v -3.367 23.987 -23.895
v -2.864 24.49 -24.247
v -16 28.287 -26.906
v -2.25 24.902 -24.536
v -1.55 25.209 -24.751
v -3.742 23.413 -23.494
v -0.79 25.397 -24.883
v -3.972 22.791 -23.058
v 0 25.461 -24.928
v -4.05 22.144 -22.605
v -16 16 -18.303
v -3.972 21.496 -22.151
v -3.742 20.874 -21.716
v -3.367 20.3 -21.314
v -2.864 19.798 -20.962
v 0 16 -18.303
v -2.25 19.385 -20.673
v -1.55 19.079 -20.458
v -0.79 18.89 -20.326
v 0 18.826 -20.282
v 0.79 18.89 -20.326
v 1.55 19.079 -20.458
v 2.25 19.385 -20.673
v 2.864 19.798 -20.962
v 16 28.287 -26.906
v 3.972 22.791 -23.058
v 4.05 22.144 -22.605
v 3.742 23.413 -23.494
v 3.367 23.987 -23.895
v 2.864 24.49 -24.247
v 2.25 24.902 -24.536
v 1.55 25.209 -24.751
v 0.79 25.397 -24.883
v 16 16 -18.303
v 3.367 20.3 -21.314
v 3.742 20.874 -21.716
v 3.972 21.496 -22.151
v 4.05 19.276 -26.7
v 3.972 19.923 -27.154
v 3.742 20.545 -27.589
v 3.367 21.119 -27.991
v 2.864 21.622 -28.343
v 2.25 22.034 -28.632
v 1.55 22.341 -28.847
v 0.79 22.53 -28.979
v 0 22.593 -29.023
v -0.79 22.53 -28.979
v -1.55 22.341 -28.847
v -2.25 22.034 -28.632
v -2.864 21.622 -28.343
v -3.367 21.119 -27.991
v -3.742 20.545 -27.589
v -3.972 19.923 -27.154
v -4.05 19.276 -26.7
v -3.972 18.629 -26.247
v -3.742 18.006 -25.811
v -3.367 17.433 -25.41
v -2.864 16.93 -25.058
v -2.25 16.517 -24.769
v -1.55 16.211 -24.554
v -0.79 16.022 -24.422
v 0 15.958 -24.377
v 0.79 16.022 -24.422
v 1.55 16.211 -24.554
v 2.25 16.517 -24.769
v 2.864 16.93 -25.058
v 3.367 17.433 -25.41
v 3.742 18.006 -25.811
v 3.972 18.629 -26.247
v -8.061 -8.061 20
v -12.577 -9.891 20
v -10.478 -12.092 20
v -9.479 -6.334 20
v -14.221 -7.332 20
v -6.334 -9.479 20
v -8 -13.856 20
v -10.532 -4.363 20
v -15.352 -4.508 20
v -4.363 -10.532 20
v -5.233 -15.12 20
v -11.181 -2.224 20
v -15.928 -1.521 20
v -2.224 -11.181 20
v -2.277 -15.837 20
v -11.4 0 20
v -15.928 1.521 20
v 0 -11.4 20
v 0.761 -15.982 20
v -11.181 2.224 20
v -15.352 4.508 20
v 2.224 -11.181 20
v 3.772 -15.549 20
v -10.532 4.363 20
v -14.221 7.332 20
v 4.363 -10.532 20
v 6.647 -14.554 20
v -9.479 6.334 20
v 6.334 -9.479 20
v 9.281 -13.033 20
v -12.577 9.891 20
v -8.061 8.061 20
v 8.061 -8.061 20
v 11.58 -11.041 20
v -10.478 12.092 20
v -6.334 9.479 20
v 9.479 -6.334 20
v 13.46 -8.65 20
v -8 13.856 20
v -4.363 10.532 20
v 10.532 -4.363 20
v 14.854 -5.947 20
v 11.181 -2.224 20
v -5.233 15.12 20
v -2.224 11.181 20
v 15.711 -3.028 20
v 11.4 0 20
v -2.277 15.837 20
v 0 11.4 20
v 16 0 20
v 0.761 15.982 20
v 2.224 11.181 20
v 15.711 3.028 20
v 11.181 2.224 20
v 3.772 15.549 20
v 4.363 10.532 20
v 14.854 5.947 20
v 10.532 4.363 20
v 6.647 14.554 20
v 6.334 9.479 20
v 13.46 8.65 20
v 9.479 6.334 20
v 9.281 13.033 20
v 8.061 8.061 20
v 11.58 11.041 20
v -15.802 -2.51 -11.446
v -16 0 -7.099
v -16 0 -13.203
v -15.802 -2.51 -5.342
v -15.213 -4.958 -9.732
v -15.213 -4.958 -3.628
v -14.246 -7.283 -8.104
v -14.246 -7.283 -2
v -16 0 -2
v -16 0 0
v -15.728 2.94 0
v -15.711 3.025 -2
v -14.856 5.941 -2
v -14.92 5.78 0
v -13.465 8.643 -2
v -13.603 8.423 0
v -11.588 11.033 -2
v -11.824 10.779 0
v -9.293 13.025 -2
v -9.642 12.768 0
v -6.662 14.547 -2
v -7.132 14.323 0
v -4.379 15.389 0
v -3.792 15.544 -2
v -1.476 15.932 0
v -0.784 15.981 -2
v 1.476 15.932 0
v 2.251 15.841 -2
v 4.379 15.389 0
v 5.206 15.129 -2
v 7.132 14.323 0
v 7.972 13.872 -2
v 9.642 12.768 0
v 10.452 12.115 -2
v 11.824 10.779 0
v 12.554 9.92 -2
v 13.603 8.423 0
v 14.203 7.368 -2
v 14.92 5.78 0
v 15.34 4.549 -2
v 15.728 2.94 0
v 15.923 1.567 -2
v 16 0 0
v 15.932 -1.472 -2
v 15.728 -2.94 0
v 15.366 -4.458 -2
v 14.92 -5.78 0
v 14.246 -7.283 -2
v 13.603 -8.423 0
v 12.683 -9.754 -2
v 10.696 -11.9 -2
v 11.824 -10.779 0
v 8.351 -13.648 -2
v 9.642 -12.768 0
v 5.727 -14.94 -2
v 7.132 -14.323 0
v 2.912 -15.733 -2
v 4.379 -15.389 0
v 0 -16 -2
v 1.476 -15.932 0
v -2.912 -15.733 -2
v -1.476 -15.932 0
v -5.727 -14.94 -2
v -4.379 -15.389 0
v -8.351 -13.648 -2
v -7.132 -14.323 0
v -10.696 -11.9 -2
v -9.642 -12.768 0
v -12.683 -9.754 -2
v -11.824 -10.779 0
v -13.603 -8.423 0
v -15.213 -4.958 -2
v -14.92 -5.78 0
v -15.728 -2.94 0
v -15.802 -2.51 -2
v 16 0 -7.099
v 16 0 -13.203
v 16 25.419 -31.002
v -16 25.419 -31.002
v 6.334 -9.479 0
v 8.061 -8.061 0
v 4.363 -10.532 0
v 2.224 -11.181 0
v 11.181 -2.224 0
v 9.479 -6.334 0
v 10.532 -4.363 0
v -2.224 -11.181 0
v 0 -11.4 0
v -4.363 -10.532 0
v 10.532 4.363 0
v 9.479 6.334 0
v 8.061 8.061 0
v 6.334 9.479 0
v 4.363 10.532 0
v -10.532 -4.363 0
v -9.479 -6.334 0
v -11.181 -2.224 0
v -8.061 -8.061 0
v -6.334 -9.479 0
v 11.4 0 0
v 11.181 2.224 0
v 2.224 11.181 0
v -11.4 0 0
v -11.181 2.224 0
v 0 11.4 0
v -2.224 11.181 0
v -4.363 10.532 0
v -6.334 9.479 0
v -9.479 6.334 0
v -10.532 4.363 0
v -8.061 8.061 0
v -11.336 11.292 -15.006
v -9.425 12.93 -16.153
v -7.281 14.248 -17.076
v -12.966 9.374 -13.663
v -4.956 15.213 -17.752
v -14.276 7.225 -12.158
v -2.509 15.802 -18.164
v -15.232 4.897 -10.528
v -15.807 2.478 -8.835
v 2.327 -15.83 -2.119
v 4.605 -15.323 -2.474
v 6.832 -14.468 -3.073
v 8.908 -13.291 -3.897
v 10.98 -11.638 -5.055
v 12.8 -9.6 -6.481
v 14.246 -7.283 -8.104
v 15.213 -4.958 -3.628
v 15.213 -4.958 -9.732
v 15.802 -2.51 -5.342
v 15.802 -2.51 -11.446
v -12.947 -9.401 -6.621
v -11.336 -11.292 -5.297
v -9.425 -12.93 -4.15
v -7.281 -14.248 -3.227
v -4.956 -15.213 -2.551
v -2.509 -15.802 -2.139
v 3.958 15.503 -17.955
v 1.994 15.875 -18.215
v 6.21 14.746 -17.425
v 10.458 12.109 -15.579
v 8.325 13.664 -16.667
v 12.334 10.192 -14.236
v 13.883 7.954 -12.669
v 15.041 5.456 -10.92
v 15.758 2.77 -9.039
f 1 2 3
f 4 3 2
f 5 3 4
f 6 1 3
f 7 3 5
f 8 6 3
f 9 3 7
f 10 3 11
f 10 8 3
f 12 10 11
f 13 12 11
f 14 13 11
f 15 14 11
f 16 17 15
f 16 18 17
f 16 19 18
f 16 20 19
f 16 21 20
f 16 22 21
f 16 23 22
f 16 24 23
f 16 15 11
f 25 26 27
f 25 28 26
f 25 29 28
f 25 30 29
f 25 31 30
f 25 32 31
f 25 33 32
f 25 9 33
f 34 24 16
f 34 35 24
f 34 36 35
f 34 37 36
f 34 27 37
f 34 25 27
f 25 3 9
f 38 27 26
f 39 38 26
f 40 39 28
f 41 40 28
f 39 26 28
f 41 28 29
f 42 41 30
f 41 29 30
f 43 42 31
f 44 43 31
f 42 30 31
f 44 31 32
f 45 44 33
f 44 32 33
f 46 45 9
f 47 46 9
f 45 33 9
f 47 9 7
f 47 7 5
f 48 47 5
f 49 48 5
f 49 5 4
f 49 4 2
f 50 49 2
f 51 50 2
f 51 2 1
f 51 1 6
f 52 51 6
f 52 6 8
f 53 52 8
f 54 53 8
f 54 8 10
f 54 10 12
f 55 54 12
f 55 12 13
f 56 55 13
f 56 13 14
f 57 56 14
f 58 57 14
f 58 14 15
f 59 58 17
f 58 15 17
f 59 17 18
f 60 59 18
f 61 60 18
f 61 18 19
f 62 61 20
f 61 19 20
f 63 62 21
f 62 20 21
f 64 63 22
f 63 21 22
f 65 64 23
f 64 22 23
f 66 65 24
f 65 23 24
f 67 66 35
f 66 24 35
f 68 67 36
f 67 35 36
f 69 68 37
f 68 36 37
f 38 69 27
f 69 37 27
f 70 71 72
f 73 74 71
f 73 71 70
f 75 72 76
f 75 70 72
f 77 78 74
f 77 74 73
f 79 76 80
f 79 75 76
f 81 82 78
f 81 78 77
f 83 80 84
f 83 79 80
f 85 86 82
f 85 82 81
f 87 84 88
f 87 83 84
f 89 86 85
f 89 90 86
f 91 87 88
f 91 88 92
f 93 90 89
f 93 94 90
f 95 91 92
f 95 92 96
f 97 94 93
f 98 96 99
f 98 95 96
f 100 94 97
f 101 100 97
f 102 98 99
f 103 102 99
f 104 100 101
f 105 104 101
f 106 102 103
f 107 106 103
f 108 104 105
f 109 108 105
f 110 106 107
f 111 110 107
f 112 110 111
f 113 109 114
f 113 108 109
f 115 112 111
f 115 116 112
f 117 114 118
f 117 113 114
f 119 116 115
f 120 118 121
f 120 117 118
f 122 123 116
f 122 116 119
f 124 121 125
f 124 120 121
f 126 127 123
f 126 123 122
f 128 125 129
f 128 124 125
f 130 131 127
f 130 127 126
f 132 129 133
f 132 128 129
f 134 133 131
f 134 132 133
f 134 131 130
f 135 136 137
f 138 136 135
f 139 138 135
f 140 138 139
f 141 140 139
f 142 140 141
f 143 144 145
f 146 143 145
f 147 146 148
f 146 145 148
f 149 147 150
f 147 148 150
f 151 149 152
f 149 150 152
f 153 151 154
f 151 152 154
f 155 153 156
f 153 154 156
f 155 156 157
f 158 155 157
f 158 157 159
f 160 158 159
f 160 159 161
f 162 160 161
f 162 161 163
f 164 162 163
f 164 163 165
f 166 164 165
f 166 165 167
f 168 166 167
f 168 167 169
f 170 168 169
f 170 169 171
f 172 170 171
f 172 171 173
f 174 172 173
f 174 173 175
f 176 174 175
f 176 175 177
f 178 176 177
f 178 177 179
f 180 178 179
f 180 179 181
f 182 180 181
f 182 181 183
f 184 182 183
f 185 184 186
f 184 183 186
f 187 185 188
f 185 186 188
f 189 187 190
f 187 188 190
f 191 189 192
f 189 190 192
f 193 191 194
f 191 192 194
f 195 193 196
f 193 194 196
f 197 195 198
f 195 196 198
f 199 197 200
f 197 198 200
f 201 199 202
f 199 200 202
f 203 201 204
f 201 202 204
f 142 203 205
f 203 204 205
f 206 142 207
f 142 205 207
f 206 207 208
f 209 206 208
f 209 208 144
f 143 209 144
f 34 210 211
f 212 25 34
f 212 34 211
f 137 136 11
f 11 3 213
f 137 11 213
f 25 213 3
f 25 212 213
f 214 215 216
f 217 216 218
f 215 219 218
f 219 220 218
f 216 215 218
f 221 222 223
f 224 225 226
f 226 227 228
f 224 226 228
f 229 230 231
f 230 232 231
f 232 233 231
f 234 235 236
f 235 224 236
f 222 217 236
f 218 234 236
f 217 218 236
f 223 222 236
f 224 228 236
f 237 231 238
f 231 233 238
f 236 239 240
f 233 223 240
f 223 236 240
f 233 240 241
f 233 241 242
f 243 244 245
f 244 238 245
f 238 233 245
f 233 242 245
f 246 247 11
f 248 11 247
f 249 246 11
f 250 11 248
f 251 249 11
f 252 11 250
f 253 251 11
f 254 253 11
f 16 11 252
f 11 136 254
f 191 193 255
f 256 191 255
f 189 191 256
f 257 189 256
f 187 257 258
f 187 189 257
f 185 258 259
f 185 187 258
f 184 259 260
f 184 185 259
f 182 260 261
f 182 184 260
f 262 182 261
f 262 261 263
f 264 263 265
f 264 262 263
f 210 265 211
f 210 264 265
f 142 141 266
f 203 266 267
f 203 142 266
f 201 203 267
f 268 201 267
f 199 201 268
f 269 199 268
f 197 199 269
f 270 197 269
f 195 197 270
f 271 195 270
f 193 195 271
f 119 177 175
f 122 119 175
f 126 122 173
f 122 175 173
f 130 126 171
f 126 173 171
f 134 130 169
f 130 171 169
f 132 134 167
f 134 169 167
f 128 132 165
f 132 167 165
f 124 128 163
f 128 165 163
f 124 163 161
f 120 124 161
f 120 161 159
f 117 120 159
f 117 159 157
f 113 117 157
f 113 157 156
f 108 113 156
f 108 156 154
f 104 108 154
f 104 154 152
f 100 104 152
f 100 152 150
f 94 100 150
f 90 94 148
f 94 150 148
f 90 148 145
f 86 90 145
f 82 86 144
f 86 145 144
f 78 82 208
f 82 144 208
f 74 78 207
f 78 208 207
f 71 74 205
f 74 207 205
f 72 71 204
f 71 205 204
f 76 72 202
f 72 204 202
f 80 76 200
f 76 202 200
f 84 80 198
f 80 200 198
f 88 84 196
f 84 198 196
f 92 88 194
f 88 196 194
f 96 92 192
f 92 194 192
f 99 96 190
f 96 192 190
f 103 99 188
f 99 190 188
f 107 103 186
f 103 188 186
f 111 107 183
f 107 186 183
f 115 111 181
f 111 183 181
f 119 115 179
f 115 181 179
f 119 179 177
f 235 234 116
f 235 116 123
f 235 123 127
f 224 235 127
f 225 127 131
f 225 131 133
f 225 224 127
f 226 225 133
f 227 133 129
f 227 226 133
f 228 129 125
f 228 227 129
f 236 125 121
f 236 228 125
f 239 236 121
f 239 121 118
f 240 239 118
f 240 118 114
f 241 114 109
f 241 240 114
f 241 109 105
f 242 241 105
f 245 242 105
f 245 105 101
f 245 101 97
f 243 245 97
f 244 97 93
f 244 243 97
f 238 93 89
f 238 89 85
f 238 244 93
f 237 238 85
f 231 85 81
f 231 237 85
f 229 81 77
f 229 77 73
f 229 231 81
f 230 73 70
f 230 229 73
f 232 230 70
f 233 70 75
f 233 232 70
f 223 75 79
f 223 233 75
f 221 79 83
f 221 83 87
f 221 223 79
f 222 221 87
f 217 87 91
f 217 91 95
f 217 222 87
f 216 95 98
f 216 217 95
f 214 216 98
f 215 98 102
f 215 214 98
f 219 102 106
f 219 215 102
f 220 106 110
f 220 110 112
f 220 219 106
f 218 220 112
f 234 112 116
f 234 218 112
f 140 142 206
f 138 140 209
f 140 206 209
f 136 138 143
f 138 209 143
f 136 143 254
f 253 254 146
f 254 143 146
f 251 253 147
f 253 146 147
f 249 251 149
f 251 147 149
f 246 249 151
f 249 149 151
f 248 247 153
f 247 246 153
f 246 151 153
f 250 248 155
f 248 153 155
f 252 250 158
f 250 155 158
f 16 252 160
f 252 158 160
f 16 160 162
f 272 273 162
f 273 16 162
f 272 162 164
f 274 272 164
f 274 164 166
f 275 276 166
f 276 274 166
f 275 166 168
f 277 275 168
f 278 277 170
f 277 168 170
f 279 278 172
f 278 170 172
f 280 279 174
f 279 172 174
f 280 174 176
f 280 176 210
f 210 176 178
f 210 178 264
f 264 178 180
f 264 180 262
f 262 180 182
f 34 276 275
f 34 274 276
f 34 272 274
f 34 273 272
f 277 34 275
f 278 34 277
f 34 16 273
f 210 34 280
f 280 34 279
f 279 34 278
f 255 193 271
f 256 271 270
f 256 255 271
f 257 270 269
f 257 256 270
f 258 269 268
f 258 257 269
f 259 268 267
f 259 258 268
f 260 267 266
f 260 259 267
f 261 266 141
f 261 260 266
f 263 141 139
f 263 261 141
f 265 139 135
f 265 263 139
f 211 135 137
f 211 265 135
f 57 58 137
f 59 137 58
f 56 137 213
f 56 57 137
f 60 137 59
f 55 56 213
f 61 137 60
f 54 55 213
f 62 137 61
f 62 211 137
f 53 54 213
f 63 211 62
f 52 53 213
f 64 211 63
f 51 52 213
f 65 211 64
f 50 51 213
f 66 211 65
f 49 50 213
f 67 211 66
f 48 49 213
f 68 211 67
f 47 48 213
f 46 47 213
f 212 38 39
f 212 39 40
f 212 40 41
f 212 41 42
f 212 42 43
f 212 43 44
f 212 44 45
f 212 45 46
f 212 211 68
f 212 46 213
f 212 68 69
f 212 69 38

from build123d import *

# Parameters (mm, degrees)
SKETCH1_R                = 16
SKETCH1_R_2              = 11.4
BOSS_EXTRUDE1_DEPTH      = 20
SKETCH2_R                = 16
BOSS_EXTRUDE2_DEPTH      = 2
BOSS_EXTRUDE3_DEPTH      = 16
BOSS_EXTRUDE3_DEPTH_BACK = 16
CUT_EXTRUDE1_DEPTH       = 30.002175046
BOSS_EXTRUDE4_REACH      = 31.002
SKETCH5_R                = 16
SKETCH6_R                = 4.05
CUT_EXTRUDE3_DEPTH       = 29.757190977


with BuildPart() as part:
    # Sketch1 → Boss-Extrude1 (new body)
    with BuildSketch(Plane.XY):
        Circle(SKETCH1_R)
        Circle(SKETCH1_R_2, mode=Mode.SUBTRACT)
    extrude(amount=BOSS_EXTRUDE1_DEPTH)

    # Sketch2 → Boss-Extrude2 (add)
    with BuildSketch(Plane(origin=(0, 0, 0), x_dir=(-1, 0, 0), z_dir=(0, 0, -1))):
        Circle(SKETCH2_R)
    extrude(amount=BOSS_EXTRUDE2_DEPTH)

    # Sketch3 → Boss-Extrude3 (add, two sides)
    with BuildSketch(Plane(origin=(0, 0, 0), x_dir=(0, 0, -1), z_dir=(1, 0, 0))) as boss_extrude3_sk:
        Polygon((31.002175046, 25.419398483), (26.906414824, 28.287280664), (18.302768279, 16), (2, -7.282766022), (2, -16), align=None)
    extrude(amount=BOSS_EXTRUDE3_DEPTH)
    extrude(boss_extrude3_sk.sketch, amount=-BOSS_EXTRUDE3_DEPTH_BACK)

    # Sketch4 → Cut-Extrude1 (cut, through all)
    with BuildSketch(Plane(origin=(0, 0, -2), x_dir=(-1, 0, 0), z_dir=(0, 0, -1))):
        with BuildLine():
            Line((34.266518051, 0), (16, 0))
            ThreePointArc((16, 0), (15.555436181, -3.745451268), (14.24644935, -7.282766022))
            ThreePointArc((14.24644935, -7.282766022), (0, -16), (-14.24644935, -7.282766022))
            ThreePointArc((-14.24644935, -7.282766022), (-15.555436181, -3.745451268), (-16, 0))
            Line((-16, 0), (-34.430612934, 0))
            Line((-34.430612934, 0), (-36.46308972, -20.488677285))
            Line((-36.46308972, -20.488677285), (32.179774964, -27.298049462))
            Line((32.179774964, -27.298049462), (34.266518051, 0))
        make_face()
    extrude(amount=CUT_EXTRUDE1_DEPTH, mode=Mode.SUBTRACT)

    # Sketch5 → Boss-Extrude4 (add, up to next)
    with BuildSketch(Plane(origin=(0, 0, -2), x_dir=(-1, 0, 0), z_dir=(0, 0, -1)), mode=Mode.PRIVATE) as boss_extrude4_sk1:
        Circle(SKETCH5_R)
    boss_extrude4_tool1 = extrude(boss_extrude4_sk1.sketch, amount=BOSS_EXTRUDE4_REACH, mode=Mode.PRIVATE) - part.part
    add(boss_extrude4_tool1.solids().sort_by_distance((0, 0, -2))[0])

    # Sketch6 → Cut-Extrude3 (cut, through all)
    with BuildSketch(Plane(origin=(0, -3.335649292, -4.763800888), x_dir=(1, 0, 0), z_dir=(0, 0.573576436, 0.819152044))):
        with Locations((0, 31.104469313)):
            Circle(SKETCH6_R)
    extrude(amount=-CUT_EXTRUDE3_DEPTH, mode=Mode.SUBTRACT)


solid = part.part
